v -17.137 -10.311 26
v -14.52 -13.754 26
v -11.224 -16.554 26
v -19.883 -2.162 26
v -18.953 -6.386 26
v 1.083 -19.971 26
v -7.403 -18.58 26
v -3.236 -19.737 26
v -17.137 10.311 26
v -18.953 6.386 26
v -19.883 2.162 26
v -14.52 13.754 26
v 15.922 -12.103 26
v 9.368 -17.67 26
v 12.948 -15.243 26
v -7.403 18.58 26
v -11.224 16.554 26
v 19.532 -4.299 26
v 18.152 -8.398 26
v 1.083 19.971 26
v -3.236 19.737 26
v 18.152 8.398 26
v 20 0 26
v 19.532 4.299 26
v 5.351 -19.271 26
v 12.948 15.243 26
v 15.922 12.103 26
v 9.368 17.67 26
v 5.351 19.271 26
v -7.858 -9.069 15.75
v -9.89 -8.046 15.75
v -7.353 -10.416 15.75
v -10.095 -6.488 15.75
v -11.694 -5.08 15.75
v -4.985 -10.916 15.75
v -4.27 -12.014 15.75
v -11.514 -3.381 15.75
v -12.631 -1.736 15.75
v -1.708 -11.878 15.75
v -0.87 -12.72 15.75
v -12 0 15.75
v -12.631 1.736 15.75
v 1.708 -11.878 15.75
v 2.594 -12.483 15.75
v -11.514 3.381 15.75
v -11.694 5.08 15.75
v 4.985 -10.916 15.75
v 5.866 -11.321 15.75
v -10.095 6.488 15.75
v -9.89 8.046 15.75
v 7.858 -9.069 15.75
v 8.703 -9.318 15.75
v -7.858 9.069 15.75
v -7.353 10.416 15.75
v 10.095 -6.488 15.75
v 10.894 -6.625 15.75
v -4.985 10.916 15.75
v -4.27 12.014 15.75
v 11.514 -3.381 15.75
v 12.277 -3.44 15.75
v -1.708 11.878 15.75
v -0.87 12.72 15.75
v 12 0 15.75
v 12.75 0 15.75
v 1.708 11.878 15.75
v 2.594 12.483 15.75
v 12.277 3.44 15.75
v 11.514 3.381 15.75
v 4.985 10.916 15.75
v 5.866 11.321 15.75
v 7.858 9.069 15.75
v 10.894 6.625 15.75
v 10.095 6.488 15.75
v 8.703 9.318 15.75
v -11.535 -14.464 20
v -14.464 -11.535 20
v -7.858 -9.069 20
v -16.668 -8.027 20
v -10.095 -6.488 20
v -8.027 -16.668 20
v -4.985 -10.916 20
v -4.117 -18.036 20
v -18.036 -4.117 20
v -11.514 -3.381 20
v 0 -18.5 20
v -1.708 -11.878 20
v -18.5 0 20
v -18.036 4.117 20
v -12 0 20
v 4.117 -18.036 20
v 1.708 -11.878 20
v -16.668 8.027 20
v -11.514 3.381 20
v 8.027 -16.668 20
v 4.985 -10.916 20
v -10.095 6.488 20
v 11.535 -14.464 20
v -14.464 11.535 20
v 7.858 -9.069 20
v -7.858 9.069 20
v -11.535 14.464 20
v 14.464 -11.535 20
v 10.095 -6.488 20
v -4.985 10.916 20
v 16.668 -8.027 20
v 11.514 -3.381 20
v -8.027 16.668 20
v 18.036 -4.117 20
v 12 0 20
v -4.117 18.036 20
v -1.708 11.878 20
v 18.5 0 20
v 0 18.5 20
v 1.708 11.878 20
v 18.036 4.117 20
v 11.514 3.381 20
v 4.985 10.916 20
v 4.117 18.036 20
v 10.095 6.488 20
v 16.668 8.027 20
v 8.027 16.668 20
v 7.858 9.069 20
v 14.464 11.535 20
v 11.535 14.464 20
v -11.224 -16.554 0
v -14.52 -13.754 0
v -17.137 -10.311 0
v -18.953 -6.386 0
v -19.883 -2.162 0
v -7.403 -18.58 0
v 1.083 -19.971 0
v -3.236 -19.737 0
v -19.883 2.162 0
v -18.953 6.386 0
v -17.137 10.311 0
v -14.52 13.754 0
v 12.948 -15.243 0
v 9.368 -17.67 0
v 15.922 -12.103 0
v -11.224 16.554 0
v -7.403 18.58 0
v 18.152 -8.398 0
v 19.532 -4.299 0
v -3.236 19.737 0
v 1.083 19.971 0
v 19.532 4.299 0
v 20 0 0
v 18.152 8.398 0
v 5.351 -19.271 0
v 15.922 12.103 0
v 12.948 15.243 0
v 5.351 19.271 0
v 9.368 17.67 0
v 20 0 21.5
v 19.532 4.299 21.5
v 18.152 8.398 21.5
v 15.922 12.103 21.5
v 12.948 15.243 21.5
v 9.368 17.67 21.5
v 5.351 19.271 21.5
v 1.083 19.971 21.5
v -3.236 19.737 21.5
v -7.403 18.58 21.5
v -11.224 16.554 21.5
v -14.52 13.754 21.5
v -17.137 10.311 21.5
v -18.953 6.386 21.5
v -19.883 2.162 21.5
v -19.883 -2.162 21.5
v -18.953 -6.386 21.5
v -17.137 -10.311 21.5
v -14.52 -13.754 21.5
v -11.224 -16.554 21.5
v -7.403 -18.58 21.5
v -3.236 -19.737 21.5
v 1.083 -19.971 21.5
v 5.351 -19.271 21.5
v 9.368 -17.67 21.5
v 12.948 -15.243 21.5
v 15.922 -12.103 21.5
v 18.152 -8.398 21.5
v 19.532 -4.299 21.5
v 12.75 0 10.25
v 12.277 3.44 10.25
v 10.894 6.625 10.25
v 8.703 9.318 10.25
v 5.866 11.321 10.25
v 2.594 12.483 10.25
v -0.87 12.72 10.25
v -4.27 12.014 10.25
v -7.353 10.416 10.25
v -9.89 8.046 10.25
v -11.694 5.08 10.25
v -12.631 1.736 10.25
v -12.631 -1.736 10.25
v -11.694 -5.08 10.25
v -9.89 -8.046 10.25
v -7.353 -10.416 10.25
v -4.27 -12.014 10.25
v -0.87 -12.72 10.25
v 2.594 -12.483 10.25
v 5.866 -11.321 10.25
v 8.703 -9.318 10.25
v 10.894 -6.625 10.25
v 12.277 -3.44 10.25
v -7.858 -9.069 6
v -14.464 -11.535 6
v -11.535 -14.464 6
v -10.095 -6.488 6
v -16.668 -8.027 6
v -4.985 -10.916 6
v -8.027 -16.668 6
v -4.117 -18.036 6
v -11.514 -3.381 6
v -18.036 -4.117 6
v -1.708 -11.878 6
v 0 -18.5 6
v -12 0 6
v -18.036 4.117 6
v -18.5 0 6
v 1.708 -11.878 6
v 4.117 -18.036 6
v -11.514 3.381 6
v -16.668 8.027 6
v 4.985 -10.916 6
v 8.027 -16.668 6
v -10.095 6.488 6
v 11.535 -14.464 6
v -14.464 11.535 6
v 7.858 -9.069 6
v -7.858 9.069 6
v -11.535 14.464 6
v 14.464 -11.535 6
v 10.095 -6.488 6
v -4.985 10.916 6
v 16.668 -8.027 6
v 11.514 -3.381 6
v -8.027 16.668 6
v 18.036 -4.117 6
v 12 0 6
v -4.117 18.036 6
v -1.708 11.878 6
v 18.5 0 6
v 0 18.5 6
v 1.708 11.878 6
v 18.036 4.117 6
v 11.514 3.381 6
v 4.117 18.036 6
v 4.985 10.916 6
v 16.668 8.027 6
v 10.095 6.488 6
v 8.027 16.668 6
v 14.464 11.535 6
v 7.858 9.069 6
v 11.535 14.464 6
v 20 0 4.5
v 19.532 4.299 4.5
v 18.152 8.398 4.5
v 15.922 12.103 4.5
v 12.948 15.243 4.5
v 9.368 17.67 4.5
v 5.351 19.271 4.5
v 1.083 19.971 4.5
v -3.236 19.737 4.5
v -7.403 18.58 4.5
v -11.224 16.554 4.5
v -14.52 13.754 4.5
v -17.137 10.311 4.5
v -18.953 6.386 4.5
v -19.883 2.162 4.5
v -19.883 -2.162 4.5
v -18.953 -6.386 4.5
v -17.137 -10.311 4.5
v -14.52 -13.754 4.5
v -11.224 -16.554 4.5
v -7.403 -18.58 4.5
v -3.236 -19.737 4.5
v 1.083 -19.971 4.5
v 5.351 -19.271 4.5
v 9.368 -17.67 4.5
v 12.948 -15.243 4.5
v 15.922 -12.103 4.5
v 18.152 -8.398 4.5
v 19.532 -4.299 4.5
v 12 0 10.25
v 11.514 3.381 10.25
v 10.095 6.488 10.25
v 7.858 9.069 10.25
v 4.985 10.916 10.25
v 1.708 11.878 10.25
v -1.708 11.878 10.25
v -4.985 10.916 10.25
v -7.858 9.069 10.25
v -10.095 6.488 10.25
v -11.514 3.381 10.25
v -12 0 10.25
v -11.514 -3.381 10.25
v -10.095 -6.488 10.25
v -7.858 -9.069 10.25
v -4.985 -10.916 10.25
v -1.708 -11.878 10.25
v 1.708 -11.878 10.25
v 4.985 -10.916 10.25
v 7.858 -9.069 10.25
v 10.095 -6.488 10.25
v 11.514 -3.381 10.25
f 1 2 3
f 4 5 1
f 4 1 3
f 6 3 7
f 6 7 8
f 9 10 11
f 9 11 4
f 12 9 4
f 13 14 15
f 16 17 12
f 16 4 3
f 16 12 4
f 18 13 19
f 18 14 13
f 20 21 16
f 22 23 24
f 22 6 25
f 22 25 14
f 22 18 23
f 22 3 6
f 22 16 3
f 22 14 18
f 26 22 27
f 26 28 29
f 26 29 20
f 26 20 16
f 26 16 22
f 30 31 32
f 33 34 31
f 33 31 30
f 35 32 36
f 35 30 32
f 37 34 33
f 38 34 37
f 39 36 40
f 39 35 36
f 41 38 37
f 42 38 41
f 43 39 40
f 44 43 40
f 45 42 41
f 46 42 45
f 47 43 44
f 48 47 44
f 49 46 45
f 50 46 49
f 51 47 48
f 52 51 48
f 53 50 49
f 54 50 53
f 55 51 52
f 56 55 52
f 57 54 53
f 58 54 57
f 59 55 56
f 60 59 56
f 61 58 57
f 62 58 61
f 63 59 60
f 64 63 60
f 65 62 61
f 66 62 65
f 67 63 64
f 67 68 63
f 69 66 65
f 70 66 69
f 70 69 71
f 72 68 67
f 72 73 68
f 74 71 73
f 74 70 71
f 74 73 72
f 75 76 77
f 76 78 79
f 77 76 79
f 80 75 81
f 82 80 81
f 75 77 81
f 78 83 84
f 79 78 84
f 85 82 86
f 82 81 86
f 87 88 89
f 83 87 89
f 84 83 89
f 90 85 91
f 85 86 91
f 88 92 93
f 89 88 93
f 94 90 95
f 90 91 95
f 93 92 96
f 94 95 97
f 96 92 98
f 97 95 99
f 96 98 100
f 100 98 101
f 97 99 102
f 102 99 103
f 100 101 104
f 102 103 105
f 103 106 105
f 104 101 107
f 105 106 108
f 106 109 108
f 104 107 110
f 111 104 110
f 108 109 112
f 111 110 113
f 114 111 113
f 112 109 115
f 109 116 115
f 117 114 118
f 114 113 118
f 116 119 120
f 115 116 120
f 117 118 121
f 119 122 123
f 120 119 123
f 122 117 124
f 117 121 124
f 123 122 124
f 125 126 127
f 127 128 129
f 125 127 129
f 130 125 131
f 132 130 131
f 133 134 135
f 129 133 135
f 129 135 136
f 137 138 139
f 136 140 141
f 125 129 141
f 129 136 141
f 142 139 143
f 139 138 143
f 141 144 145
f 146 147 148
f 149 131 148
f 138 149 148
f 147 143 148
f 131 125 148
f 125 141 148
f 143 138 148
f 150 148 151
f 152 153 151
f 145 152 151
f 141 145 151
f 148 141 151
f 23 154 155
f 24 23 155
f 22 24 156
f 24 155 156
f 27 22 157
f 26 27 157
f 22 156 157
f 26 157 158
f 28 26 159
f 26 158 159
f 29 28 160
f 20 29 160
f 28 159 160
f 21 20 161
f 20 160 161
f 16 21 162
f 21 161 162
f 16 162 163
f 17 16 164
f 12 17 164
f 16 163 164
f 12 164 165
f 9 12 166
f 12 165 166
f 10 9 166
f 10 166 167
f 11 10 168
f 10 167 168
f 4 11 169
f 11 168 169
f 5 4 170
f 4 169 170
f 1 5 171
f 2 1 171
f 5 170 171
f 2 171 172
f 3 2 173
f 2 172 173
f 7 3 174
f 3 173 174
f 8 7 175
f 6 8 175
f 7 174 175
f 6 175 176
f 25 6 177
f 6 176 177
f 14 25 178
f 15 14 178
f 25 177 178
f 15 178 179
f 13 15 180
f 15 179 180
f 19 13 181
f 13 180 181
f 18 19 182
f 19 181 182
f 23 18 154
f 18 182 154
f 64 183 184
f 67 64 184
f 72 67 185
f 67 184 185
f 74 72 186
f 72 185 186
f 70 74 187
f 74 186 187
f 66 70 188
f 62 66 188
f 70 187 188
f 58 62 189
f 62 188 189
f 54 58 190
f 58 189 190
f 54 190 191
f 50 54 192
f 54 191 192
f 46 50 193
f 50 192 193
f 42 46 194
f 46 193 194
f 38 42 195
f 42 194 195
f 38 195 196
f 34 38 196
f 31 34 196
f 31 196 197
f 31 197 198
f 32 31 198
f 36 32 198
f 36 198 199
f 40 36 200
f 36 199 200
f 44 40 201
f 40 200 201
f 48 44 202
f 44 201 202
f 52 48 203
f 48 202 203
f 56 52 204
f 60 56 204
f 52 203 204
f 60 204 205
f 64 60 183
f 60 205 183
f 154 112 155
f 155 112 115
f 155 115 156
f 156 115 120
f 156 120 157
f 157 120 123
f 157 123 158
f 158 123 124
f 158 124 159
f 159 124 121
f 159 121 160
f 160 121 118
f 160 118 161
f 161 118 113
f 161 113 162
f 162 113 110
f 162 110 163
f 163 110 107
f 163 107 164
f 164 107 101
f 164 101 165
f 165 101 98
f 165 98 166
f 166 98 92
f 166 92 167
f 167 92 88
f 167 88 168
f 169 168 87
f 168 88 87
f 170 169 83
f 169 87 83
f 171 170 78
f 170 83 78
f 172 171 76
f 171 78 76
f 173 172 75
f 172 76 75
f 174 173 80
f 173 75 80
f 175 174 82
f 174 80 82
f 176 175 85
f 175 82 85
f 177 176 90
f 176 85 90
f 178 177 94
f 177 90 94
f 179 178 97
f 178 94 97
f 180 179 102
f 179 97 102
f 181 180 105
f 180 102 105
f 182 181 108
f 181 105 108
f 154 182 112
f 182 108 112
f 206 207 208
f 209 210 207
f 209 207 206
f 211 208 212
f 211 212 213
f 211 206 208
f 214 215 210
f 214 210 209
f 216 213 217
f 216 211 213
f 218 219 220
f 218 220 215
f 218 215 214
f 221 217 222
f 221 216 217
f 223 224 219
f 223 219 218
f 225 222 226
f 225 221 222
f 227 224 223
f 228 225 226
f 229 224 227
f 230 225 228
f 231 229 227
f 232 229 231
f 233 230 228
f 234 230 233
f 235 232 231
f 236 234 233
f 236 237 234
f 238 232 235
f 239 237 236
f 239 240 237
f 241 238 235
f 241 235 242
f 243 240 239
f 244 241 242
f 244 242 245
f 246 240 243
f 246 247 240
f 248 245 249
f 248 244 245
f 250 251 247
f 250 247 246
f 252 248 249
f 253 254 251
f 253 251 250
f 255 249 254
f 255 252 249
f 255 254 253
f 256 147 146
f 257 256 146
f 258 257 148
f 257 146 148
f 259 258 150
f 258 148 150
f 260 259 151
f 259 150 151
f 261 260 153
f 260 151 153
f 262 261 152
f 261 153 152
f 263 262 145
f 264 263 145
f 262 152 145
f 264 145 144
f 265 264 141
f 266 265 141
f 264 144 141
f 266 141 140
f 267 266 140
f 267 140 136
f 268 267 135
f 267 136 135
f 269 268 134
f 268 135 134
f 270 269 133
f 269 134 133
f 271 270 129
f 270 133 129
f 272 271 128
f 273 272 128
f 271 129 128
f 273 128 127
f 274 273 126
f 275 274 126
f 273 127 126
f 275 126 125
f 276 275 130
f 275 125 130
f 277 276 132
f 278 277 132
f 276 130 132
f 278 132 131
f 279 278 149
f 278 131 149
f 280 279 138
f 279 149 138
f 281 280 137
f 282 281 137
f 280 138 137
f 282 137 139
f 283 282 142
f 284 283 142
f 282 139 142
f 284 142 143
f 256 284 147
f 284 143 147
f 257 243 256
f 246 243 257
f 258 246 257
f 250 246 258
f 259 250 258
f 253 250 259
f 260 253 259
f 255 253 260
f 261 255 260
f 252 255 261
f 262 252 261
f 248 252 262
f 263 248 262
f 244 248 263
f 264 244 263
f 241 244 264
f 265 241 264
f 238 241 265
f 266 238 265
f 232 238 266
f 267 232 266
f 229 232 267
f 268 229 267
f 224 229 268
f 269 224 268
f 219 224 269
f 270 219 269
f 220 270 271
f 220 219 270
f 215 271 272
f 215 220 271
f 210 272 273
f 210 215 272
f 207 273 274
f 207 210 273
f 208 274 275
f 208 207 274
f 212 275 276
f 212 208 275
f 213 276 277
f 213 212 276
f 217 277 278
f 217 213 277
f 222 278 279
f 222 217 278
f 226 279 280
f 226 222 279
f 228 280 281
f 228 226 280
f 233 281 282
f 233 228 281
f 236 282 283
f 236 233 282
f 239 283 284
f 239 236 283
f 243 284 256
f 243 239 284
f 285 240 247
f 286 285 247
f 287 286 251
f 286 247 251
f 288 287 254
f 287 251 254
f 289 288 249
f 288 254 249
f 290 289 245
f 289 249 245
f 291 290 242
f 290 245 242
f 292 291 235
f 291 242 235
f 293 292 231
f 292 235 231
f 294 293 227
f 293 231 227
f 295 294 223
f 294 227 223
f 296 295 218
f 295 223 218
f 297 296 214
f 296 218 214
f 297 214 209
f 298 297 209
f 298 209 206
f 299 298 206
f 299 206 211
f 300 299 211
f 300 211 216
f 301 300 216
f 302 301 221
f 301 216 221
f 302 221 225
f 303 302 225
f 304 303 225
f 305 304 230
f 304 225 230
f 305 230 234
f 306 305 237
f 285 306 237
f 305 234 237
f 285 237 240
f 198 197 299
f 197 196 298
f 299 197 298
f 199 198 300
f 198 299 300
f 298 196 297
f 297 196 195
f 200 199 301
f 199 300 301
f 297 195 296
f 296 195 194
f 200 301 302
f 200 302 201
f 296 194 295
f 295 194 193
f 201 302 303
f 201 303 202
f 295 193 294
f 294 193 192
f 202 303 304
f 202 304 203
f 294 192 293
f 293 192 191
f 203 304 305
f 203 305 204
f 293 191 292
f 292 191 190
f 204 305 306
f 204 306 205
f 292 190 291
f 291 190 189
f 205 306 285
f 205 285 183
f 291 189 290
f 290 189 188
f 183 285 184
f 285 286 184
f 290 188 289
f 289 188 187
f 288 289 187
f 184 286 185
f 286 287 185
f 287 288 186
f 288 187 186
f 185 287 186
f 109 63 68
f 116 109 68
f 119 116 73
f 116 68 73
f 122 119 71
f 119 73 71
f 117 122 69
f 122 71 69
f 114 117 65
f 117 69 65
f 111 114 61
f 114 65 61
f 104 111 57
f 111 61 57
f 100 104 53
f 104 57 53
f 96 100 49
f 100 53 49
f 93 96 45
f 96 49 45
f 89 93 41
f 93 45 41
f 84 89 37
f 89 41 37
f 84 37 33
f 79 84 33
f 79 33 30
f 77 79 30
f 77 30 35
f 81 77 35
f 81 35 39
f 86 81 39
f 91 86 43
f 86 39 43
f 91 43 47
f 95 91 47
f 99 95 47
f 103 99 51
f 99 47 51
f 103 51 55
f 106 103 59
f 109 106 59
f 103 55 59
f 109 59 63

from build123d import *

# Parameters (mm, degrees)
F0_R      = 20
F1_DEPTH  = 6
F2_SIZE   = 1.5
F4_R      = 12
F5_DEPTH  = 4.25
F7_R      = 12.75
F8_DEPTH  = 5.5
F10_R     = 12
F11_DEPTH = 4.25
F13_R     = 20
F14_DEPTH = 6
F15_SIZE  = 1.5


with BuildPart() as f1:
    # F0 (on Top) → F1 (new body)
    with BuildSketch(Plane.XY):
        Circle(F0_R)
    extrude(amount=F1_DEPTH)

    # F2
    f2_edges = [f1.edges().sort_by_distance(p)[0] for p in [
        (-20, 0, 6),
    ]]
    chamfer(f2_edges, length=F2_SIZE)

    # F4 (on offset) → F5 (join)
    with BuildSketch(Plane.XY.offset(6)):
        Circle(F4_R)
    extrude(amount=F5_DEPTH)

    # F7 (on offset) → F8 (join)
    with BuildSketch(Plane.XY.offset(10.25)):
        Circle(F7_R)
    extrude(amount=F8_DEPTH)

    # F10 (on offset) → F11 (join)
    with BuildSketch(Plane.XY.offset(15.75)):
        Circle(F10_R)
    extrude(amount=F11_DEPTH)

    # F13 (on offset) → F14 (join)
    with BuildSketch(Plane.XY.offset(20)):
        Circle(F13_R)
    extrude(amount=F14_DEPTH)

    # F15
    f15_edges = [f1.edges().sort_by_distance(p)[0] for p in [
        (-20, 0, 20),
    ]]
    chamfer(f15_edges, length=F15_SIZE)


solid = f1.part
